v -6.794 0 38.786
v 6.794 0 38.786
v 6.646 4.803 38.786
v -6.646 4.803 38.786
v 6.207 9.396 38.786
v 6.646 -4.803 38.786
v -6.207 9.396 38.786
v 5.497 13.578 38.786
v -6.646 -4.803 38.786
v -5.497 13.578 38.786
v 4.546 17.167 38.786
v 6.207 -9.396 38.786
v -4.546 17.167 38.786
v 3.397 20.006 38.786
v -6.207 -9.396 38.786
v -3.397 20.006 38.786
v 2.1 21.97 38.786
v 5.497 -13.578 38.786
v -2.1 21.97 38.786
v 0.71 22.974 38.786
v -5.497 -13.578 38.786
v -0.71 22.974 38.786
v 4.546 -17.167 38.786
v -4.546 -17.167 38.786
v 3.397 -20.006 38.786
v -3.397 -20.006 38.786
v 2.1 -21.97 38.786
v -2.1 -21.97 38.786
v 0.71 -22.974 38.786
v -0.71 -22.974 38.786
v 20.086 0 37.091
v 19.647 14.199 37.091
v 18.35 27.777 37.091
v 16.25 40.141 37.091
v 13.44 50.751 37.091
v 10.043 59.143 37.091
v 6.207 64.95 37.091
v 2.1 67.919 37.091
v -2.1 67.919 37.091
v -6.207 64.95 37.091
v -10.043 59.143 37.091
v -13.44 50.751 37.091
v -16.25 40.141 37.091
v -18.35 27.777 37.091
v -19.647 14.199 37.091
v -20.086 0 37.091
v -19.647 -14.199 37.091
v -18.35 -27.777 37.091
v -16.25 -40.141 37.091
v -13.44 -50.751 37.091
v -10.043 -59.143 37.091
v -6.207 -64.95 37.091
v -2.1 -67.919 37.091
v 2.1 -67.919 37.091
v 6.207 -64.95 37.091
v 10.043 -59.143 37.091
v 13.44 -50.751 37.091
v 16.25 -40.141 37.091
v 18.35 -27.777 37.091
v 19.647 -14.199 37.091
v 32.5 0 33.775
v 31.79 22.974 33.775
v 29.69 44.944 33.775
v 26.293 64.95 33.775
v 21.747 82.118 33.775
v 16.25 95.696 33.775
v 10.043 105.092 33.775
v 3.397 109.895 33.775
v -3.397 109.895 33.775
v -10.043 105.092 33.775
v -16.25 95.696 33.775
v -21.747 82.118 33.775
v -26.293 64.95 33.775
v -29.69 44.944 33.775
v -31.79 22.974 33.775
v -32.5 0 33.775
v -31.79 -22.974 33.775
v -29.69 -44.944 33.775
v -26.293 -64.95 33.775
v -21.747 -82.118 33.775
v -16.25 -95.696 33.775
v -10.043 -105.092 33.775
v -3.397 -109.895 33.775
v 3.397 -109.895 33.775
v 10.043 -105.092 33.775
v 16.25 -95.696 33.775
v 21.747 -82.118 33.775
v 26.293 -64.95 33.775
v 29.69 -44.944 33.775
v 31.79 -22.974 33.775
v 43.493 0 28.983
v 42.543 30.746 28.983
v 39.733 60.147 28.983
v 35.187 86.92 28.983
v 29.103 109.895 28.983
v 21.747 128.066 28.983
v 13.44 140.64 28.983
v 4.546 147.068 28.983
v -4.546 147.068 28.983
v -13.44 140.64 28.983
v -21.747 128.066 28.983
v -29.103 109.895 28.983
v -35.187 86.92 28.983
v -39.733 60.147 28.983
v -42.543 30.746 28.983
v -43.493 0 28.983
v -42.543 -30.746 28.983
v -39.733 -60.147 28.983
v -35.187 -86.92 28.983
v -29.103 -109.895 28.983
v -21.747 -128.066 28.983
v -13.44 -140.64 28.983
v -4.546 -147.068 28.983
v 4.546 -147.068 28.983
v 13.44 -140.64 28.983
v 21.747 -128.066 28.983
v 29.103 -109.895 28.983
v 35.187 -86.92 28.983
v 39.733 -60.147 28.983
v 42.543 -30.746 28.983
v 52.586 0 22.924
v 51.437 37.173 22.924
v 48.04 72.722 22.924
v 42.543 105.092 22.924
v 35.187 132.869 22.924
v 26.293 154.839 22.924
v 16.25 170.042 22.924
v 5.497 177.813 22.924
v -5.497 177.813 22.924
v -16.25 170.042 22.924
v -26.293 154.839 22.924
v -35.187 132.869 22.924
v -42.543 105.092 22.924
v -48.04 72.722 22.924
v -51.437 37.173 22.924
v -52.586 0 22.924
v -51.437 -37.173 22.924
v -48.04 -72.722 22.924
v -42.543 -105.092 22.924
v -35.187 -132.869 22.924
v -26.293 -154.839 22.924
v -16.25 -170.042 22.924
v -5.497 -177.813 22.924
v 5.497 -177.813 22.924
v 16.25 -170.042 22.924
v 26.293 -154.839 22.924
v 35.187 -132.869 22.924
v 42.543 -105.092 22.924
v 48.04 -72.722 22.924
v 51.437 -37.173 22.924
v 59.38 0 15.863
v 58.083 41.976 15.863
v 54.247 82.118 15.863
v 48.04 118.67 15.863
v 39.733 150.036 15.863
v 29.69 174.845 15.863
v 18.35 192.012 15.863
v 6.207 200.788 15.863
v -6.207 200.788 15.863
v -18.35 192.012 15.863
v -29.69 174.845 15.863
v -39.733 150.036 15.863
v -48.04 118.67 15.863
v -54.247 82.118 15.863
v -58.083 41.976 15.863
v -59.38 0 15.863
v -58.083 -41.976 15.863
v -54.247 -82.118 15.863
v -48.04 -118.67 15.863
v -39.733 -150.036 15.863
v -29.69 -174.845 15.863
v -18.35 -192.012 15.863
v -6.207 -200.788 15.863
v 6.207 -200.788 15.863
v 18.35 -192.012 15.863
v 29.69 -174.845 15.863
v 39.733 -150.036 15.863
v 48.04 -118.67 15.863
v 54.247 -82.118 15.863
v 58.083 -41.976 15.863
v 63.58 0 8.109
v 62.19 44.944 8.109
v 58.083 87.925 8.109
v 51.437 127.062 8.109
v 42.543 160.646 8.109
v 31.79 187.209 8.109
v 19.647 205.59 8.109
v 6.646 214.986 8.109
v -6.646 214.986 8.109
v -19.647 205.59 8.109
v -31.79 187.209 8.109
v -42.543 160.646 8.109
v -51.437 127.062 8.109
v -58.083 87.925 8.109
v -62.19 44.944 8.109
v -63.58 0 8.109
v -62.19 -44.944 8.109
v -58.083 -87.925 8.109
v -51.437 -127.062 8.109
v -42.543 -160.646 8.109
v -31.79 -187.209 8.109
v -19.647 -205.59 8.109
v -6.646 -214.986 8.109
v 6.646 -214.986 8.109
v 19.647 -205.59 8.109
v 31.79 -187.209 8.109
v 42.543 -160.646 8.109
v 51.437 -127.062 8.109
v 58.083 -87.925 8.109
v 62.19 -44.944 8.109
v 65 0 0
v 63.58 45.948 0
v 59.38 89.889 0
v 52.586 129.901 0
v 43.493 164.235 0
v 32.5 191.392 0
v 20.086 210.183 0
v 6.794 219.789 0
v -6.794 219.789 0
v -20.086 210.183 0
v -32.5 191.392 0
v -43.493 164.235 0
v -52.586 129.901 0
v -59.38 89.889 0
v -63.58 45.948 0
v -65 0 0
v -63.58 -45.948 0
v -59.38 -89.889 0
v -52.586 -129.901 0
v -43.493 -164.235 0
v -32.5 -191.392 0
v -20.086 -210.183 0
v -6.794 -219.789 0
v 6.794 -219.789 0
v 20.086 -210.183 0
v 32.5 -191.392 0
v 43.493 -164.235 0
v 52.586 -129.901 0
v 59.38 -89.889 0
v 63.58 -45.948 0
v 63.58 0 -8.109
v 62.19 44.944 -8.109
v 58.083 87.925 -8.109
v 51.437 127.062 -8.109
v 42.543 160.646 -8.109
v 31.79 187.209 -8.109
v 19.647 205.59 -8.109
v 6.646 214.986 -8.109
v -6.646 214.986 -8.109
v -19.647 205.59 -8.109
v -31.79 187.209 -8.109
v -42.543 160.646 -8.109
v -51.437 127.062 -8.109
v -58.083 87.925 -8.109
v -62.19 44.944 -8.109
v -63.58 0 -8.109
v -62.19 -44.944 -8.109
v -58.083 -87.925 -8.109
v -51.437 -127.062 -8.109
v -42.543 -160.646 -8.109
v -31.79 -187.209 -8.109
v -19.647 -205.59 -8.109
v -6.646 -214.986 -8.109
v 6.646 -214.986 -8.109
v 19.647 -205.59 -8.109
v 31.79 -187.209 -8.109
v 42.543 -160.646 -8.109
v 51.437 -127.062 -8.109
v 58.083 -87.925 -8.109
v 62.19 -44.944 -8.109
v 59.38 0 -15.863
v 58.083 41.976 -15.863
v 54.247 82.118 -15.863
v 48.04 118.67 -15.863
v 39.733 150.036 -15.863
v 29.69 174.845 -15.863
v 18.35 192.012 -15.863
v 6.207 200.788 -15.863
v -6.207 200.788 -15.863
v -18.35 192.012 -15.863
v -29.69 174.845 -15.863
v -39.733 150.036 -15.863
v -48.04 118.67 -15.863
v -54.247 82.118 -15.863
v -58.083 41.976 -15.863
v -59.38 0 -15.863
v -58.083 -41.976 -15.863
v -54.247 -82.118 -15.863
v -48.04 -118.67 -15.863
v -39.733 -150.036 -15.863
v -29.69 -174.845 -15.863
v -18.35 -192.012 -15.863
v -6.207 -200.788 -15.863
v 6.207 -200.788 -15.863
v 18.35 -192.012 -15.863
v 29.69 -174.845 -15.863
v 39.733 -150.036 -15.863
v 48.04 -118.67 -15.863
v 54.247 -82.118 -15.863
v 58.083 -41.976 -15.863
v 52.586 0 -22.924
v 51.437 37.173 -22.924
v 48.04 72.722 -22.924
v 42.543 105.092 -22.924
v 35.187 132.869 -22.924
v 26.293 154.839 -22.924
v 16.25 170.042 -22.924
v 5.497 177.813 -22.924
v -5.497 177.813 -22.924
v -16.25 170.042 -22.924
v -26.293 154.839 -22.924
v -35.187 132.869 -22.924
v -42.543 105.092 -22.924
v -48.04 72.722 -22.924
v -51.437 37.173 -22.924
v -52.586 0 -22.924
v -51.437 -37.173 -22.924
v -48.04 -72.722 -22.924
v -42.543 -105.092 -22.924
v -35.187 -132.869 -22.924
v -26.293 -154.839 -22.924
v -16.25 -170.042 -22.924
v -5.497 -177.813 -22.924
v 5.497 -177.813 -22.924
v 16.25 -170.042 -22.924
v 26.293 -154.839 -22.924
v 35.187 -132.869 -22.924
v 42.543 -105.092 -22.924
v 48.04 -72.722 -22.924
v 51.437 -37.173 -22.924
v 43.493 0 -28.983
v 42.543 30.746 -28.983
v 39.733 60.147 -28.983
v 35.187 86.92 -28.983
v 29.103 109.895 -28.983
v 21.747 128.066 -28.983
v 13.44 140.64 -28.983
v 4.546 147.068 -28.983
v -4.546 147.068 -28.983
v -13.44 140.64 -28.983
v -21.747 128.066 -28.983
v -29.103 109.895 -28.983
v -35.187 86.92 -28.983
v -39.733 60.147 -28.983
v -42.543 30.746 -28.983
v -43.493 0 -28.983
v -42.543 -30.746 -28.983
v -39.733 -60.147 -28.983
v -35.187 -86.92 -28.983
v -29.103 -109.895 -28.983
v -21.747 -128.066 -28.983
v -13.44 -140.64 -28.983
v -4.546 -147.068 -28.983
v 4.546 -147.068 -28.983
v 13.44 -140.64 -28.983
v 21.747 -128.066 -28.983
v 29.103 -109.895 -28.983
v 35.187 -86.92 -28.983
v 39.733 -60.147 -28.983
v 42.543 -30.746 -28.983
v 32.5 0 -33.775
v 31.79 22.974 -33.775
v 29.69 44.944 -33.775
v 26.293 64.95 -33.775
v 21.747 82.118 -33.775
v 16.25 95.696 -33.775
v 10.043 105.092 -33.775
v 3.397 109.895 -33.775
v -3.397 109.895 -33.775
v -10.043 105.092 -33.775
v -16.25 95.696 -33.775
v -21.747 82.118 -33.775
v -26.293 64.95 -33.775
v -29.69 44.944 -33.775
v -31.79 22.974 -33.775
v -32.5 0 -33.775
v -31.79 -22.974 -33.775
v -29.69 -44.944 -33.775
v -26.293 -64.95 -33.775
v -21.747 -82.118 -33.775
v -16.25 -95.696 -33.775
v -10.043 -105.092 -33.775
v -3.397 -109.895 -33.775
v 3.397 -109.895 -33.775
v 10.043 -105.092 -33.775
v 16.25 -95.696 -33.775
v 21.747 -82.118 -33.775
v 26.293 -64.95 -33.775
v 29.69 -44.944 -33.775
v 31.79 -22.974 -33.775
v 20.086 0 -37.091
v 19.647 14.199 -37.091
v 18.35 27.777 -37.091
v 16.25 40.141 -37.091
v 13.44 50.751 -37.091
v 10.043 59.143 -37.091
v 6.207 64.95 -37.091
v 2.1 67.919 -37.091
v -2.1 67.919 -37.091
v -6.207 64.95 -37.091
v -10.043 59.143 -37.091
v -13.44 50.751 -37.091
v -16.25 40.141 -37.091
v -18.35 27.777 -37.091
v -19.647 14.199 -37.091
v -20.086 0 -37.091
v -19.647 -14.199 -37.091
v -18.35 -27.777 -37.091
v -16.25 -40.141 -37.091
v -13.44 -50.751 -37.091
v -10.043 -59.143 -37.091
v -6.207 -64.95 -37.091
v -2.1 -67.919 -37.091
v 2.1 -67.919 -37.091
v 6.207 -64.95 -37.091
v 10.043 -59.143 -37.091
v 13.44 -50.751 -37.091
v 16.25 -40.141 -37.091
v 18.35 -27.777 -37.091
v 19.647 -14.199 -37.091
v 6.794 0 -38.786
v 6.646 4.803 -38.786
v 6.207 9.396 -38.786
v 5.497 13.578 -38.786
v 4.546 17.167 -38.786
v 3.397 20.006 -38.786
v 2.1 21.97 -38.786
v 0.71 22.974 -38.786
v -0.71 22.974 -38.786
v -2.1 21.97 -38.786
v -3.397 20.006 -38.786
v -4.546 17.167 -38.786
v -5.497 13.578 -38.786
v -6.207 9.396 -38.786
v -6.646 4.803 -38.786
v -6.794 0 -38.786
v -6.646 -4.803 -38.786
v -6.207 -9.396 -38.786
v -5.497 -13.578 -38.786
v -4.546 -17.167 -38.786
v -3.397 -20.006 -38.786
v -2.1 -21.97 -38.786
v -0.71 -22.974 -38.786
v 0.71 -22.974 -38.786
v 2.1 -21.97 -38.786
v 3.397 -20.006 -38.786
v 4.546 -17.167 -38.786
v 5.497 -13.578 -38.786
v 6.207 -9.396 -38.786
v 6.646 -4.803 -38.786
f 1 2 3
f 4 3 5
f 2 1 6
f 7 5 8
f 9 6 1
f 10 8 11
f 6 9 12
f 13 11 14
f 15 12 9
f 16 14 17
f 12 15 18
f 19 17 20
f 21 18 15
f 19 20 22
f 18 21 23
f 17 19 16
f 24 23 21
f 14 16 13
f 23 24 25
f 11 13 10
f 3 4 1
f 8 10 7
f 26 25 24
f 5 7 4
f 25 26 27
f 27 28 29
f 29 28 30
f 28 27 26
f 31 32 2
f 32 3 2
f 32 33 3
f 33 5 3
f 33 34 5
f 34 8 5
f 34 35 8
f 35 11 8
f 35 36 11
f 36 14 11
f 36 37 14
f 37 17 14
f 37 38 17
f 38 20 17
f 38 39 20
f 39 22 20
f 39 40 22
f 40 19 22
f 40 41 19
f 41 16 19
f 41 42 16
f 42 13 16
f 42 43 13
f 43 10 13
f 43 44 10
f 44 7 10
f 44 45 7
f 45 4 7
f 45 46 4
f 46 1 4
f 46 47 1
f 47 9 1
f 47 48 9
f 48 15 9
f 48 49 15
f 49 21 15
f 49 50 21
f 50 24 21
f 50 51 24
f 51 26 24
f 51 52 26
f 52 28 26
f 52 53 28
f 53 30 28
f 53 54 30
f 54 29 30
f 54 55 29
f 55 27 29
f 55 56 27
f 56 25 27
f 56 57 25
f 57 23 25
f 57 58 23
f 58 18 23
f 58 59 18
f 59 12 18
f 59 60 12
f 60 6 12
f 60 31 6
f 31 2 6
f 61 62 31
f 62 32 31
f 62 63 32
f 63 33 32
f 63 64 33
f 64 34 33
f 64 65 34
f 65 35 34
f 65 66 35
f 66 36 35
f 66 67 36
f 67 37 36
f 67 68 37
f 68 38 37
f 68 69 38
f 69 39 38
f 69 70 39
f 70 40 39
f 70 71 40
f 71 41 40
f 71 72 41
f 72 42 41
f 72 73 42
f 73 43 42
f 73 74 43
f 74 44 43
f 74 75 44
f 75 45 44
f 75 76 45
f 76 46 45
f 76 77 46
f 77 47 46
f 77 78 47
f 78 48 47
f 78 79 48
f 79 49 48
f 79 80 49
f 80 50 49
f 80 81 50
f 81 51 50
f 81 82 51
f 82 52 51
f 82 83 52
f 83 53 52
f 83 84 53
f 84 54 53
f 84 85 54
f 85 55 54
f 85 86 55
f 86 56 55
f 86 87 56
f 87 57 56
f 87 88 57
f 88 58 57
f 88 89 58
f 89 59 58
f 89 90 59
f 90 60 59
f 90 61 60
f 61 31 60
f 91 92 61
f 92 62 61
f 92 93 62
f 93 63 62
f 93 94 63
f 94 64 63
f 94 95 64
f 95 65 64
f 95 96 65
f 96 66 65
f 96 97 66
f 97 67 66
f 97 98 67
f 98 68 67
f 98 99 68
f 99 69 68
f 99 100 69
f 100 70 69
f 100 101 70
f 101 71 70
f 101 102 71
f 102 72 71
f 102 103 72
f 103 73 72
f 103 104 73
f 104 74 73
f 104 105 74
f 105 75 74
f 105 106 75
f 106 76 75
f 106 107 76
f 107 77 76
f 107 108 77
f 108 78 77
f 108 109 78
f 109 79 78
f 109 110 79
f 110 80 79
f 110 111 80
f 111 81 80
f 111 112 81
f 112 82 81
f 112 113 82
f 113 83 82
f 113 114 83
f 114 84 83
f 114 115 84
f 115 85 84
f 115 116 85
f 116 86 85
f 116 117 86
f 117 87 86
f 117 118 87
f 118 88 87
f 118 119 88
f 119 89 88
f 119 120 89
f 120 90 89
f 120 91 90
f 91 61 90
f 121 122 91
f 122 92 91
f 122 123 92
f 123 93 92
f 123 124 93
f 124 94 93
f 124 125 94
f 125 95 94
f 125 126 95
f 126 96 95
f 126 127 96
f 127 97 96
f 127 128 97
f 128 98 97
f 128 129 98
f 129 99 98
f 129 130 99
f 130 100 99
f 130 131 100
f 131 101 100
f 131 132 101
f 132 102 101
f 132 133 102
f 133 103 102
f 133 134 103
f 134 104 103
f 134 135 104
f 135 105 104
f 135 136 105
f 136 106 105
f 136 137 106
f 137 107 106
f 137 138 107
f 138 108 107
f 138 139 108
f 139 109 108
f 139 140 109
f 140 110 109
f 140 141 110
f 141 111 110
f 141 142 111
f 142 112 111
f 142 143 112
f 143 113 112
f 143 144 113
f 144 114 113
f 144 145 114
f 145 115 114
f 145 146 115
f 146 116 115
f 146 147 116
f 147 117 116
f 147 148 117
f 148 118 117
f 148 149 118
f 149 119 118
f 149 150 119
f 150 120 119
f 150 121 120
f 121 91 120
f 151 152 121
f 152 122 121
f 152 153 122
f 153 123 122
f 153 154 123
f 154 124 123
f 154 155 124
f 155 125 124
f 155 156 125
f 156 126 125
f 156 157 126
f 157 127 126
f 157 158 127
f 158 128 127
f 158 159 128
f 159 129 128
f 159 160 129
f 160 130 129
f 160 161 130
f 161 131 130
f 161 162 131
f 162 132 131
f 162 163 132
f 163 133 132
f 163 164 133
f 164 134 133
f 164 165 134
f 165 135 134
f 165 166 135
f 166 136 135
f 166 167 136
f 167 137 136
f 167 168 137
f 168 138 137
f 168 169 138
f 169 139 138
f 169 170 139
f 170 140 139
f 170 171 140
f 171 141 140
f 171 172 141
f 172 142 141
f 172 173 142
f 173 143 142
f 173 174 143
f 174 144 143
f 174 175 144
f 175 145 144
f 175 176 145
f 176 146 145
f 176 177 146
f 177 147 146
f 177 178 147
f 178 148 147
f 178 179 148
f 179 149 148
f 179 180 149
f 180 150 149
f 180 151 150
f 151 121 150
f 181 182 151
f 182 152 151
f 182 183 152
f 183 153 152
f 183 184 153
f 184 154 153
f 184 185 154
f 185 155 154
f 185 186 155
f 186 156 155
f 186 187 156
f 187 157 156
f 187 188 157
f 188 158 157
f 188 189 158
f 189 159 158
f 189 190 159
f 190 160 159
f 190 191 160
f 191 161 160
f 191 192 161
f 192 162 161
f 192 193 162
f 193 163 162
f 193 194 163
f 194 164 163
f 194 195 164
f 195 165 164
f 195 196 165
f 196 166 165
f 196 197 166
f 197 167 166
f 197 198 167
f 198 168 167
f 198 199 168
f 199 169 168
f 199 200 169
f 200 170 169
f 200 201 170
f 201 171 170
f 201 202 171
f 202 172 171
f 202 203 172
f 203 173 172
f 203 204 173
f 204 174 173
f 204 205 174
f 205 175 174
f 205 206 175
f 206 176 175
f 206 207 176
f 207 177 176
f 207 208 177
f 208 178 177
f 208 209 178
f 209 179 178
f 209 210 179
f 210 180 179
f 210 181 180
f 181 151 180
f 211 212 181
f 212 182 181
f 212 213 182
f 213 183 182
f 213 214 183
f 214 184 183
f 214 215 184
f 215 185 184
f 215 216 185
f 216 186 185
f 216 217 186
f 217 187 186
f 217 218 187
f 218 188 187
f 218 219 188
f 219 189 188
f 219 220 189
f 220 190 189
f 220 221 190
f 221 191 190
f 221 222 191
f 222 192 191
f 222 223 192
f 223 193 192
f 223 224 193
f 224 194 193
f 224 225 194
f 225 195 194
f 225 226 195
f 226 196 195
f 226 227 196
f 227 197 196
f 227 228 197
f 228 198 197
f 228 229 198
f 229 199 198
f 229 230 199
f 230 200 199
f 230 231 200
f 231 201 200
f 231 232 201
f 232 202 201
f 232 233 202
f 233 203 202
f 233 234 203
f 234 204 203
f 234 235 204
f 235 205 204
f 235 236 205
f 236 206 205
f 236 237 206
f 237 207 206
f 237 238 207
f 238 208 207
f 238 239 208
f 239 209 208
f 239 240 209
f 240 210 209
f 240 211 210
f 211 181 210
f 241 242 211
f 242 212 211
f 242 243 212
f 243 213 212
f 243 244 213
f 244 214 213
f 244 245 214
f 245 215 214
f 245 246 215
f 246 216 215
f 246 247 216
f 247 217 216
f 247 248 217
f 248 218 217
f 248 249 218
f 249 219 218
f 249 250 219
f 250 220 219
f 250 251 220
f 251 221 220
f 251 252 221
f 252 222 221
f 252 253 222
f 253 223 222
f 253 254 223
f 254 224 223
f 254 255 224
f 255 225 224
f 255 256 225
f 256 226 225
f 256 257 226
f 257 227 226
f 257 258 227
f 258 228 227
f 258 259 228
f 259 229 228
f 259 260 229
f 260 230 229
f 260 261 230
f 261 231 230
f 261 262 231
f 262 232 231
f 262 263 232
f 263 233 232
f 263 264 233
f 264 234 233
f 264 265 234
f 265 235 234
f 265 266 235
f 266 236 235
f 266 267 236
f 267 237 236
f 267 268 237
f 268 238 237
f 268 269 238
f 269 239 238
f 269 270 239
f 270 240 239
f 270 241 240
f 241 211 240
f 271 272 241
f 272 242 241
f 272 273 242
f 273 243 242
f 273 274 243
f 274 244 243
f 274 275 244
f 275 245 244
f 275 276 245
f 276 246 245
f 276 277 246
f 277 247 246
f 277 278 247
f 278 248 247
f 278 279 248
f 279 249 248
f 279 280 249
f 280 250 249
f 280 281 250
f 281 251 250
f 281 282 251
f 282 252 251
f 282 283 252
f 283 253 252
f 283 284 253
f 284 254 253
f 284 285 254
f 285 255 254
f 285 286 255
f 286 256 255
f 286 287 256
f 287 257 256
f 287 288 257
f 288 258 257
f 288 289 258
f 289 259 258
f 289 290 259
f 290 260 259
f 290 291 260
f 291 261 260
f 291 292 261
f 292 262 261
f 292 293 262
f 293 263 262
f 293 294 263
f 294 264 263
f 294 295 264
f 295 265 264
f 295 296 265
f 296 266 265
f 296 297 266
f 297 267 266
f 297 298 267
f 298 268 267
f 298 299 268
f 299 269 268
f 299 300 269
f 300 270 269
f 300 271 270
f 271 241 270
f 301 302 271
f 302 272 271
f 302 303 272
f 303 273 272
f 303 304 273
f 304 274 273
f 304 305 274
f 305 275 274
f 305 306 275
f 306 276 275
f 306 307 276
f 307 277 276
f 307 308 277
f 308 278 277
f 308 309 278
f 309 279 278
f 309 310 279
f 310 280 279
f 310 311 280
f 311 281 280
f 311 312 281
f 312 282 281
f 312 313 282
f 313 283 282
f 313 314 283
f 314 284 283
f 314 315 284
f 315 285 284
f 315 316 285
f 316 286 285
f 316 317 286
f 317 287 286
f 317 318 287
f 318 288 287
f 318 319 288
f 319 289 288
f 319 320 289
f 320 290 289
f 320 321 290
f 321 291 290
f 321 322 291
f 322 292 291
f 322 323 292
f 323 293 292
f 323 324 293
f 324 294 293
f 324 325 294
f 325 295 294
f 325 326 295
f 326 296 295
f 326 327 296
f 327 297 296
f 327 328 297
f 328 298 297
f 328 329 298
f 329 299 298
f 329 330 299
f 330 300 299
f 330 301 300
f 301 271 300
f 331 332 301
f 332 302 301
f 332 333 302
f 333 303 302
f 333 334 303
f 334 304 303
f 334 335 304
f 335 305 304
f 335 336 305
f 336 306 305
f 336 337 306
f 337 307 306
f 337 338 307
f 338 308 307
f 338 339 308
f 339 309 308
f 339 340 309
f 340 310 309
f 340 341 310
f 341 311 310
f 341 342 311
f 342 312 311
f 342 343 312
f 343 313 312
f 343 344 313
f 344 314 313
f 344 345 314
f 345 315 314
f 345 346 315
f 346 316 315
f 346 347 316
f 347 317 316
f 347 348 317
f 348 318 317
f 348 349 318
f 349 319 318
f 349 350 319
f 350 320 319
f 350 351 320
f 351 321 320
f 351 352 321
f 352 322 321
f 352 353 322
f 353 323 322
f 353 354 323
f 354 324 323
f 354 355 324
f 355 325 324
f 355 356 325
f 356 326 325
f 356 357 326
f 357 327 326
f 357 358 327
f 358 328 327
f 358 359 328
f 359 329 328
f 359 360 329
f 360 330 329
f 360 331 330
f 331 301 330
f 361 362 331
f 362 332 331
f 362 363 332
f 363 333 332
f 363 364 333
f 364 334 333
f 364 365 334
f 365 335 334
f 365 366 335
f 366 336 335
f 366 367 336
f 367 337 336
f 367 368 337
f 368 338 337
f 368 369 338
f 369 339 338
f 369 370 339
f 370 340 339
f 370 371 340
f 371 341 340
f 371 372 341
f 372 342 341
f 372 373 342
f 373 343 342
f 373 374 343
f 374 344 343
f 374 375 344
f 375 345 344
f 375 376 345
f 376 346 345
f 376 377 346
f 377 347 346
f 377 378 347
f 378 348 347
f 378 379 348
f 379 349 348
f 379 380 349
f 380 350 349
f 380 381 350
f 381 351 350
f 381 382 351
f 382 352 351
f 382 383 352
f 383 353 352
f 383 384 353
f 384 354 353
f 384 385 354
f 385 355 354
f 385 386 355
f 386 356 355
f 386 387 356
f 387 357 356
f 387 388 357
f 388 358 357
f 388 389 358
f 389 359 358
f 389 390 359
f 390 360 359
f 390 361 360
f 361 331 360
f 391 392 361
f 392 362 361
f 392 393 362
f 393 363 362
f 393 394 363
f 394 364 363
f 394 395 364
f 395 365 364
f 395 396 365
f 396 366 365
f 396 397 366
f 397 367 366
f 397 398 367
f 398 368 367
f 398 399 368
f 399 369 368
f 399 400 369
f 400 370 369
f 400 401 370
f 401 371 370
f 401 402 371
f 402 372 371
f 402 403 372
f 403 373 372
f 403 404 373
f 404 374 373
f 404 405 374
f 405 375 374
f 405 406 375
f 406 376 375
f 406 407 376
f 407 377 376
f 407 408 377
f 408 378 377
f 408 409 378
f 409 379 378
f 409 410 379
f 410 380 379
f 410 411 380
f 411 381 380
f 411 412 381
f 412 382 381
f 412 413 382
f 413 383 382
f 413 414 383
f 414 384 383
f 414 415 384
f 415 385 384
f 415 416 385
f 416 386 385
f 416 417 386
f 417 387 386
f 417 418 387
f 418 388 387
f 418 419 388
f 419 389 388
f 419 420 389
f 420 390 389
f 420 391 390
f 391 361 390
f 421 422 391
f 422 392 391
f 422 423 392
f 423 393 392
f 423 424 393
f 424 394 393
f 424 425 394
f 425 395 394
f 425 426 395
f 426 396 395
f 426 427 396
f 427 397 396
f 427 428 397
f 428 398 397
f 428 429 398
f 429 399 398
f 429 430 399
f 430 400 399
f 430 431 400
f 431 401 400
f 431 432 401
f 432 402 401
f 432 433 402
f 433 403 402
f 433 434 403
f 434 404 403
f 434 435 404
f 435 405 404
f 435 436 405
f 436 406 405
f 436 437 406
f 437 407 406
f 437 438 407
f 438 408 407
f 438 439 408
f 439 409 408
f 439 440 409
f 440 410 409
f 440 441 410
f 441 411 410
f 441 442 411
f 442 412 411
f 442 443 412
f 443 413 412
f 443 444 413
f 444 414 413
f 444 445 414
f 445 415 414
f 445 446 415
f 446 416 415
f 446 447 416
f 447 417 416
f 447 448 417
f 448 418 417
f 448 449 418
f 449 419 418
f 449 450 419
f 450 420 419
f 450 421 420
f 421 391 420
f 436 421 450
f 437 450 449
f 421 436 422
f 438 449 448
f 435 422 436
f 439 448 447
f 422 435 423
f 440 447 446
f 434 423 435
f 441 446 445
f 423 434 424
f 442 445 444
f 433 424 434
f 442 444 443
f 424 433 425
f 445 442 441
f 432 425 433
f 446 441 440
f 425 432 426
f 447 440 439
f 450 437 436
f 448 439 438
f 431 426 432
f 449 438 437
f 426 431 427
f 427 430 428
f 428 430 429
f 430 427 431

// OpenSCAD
// Generated by SolidPython 1.0.1 on 2020-07-29 00:46:46


scale(v = [5, 17, 3]) {
	sphere(r = 13);
}
/***********************************************
*********      SolidPython code:      **********
************************************************
 
# import packages: SolidPython
from solid import *
from solid.utils import *
from itertools import chain, combinations, permutations


class Resize:

    def __init__(self, scad_file):
        self.scad_file = scad_file
        #self.scad_file = import_scad(scad_file)
        # cone/cylinder param:
        self.r1 = 0
        self.r2 = 0
        self.h = 0
        # rectangular prism param:
        self.w = 0
        self.l = 0
        # ellipse param:
        self.r = 0

    # import OpenScad code (file name corresponds to shape)


    # classify shape + parameters
    def assign(self, param1, param2, param3):
        if self.scad_file == 'cone.scad':
            self.r1 = param1
            self.r2 = param2
            self.h = param3
        elif self.scad_file == 'cylinder.scad':
            self.r1 = param1
            self.r2 = param2
            self.h = param3
        elif self.scad_file == 'rectangularPrism.scad':
            self.h = param1
            self.l = param2
            self.w = param3
        else:
            self.r = param1
            self.h = param2

    # resize parameters
    def iterate(self):
        x = range(3, 20, 2)
        i = 1
        if self.scad_file == 'cone.scad':
            tempList = list(permutations(x, 2))
            for temp in tempList:
                param1 = temp[0]
                param2 = temp[1]
                filepath = 'produced_scad_files/' + 'cone' + str(param1) + '_' + str(param2) + '_' + '.scad'
                scad_render_to_file(cylinder(h=param1, r1=param2, r2=0), filepath)

        elif self.scad_file == 'cylinder.scad':
            tempList = list(permutations(x, 3))
            for temp in tempList:
                param1 = temp[0]
                param2 = temp[1]
                filepath = 'produced_scad_files/' + 'cylinder' + str(param1) + '_' + str(param2) + '_' + '.scad'
                scad_render_to_file(cylinder(h=param1, r1=param2, r2=param2), filepath)

        elif self.scad_file == 'rectangularPrism.scad':
            tempList = list(permutations(x, 3))
            for temp in tempList:
                param1 = temp[0]
                param2 = temp[1]
                param3 = temp[2]
                filepath = 'produced_scad_files/' + 'rectangularPrism' + str(param1) + '_' + str(param2) + '_' + str(
                    param3) + '.scad'
                scad_render_to_file(cube(size=(param1, param2, param3)), filepath)

        elif self.scad_file == 'ellipse.scad':
            tempList = list(permutations(x, 4))
            for temp in tempList:
                param1 = temp[0]
                param2 = temp[1]
                param3 = temp[2]
                param4 = temp[3]
                filepath = 'produced_scad_files/' + 'ellipse' + str(param1) + '_' + str(param2) + '_' + str(param3) + '_' + str(param4) + '.scad'
                scad_render_to_file(scale([param1, param2, param3])(sphere(r=param4)), filepath)

    def render_to_scadfile(self):
        scad_render_to_file(scad, 'example.scad') 
 
************************************************/
